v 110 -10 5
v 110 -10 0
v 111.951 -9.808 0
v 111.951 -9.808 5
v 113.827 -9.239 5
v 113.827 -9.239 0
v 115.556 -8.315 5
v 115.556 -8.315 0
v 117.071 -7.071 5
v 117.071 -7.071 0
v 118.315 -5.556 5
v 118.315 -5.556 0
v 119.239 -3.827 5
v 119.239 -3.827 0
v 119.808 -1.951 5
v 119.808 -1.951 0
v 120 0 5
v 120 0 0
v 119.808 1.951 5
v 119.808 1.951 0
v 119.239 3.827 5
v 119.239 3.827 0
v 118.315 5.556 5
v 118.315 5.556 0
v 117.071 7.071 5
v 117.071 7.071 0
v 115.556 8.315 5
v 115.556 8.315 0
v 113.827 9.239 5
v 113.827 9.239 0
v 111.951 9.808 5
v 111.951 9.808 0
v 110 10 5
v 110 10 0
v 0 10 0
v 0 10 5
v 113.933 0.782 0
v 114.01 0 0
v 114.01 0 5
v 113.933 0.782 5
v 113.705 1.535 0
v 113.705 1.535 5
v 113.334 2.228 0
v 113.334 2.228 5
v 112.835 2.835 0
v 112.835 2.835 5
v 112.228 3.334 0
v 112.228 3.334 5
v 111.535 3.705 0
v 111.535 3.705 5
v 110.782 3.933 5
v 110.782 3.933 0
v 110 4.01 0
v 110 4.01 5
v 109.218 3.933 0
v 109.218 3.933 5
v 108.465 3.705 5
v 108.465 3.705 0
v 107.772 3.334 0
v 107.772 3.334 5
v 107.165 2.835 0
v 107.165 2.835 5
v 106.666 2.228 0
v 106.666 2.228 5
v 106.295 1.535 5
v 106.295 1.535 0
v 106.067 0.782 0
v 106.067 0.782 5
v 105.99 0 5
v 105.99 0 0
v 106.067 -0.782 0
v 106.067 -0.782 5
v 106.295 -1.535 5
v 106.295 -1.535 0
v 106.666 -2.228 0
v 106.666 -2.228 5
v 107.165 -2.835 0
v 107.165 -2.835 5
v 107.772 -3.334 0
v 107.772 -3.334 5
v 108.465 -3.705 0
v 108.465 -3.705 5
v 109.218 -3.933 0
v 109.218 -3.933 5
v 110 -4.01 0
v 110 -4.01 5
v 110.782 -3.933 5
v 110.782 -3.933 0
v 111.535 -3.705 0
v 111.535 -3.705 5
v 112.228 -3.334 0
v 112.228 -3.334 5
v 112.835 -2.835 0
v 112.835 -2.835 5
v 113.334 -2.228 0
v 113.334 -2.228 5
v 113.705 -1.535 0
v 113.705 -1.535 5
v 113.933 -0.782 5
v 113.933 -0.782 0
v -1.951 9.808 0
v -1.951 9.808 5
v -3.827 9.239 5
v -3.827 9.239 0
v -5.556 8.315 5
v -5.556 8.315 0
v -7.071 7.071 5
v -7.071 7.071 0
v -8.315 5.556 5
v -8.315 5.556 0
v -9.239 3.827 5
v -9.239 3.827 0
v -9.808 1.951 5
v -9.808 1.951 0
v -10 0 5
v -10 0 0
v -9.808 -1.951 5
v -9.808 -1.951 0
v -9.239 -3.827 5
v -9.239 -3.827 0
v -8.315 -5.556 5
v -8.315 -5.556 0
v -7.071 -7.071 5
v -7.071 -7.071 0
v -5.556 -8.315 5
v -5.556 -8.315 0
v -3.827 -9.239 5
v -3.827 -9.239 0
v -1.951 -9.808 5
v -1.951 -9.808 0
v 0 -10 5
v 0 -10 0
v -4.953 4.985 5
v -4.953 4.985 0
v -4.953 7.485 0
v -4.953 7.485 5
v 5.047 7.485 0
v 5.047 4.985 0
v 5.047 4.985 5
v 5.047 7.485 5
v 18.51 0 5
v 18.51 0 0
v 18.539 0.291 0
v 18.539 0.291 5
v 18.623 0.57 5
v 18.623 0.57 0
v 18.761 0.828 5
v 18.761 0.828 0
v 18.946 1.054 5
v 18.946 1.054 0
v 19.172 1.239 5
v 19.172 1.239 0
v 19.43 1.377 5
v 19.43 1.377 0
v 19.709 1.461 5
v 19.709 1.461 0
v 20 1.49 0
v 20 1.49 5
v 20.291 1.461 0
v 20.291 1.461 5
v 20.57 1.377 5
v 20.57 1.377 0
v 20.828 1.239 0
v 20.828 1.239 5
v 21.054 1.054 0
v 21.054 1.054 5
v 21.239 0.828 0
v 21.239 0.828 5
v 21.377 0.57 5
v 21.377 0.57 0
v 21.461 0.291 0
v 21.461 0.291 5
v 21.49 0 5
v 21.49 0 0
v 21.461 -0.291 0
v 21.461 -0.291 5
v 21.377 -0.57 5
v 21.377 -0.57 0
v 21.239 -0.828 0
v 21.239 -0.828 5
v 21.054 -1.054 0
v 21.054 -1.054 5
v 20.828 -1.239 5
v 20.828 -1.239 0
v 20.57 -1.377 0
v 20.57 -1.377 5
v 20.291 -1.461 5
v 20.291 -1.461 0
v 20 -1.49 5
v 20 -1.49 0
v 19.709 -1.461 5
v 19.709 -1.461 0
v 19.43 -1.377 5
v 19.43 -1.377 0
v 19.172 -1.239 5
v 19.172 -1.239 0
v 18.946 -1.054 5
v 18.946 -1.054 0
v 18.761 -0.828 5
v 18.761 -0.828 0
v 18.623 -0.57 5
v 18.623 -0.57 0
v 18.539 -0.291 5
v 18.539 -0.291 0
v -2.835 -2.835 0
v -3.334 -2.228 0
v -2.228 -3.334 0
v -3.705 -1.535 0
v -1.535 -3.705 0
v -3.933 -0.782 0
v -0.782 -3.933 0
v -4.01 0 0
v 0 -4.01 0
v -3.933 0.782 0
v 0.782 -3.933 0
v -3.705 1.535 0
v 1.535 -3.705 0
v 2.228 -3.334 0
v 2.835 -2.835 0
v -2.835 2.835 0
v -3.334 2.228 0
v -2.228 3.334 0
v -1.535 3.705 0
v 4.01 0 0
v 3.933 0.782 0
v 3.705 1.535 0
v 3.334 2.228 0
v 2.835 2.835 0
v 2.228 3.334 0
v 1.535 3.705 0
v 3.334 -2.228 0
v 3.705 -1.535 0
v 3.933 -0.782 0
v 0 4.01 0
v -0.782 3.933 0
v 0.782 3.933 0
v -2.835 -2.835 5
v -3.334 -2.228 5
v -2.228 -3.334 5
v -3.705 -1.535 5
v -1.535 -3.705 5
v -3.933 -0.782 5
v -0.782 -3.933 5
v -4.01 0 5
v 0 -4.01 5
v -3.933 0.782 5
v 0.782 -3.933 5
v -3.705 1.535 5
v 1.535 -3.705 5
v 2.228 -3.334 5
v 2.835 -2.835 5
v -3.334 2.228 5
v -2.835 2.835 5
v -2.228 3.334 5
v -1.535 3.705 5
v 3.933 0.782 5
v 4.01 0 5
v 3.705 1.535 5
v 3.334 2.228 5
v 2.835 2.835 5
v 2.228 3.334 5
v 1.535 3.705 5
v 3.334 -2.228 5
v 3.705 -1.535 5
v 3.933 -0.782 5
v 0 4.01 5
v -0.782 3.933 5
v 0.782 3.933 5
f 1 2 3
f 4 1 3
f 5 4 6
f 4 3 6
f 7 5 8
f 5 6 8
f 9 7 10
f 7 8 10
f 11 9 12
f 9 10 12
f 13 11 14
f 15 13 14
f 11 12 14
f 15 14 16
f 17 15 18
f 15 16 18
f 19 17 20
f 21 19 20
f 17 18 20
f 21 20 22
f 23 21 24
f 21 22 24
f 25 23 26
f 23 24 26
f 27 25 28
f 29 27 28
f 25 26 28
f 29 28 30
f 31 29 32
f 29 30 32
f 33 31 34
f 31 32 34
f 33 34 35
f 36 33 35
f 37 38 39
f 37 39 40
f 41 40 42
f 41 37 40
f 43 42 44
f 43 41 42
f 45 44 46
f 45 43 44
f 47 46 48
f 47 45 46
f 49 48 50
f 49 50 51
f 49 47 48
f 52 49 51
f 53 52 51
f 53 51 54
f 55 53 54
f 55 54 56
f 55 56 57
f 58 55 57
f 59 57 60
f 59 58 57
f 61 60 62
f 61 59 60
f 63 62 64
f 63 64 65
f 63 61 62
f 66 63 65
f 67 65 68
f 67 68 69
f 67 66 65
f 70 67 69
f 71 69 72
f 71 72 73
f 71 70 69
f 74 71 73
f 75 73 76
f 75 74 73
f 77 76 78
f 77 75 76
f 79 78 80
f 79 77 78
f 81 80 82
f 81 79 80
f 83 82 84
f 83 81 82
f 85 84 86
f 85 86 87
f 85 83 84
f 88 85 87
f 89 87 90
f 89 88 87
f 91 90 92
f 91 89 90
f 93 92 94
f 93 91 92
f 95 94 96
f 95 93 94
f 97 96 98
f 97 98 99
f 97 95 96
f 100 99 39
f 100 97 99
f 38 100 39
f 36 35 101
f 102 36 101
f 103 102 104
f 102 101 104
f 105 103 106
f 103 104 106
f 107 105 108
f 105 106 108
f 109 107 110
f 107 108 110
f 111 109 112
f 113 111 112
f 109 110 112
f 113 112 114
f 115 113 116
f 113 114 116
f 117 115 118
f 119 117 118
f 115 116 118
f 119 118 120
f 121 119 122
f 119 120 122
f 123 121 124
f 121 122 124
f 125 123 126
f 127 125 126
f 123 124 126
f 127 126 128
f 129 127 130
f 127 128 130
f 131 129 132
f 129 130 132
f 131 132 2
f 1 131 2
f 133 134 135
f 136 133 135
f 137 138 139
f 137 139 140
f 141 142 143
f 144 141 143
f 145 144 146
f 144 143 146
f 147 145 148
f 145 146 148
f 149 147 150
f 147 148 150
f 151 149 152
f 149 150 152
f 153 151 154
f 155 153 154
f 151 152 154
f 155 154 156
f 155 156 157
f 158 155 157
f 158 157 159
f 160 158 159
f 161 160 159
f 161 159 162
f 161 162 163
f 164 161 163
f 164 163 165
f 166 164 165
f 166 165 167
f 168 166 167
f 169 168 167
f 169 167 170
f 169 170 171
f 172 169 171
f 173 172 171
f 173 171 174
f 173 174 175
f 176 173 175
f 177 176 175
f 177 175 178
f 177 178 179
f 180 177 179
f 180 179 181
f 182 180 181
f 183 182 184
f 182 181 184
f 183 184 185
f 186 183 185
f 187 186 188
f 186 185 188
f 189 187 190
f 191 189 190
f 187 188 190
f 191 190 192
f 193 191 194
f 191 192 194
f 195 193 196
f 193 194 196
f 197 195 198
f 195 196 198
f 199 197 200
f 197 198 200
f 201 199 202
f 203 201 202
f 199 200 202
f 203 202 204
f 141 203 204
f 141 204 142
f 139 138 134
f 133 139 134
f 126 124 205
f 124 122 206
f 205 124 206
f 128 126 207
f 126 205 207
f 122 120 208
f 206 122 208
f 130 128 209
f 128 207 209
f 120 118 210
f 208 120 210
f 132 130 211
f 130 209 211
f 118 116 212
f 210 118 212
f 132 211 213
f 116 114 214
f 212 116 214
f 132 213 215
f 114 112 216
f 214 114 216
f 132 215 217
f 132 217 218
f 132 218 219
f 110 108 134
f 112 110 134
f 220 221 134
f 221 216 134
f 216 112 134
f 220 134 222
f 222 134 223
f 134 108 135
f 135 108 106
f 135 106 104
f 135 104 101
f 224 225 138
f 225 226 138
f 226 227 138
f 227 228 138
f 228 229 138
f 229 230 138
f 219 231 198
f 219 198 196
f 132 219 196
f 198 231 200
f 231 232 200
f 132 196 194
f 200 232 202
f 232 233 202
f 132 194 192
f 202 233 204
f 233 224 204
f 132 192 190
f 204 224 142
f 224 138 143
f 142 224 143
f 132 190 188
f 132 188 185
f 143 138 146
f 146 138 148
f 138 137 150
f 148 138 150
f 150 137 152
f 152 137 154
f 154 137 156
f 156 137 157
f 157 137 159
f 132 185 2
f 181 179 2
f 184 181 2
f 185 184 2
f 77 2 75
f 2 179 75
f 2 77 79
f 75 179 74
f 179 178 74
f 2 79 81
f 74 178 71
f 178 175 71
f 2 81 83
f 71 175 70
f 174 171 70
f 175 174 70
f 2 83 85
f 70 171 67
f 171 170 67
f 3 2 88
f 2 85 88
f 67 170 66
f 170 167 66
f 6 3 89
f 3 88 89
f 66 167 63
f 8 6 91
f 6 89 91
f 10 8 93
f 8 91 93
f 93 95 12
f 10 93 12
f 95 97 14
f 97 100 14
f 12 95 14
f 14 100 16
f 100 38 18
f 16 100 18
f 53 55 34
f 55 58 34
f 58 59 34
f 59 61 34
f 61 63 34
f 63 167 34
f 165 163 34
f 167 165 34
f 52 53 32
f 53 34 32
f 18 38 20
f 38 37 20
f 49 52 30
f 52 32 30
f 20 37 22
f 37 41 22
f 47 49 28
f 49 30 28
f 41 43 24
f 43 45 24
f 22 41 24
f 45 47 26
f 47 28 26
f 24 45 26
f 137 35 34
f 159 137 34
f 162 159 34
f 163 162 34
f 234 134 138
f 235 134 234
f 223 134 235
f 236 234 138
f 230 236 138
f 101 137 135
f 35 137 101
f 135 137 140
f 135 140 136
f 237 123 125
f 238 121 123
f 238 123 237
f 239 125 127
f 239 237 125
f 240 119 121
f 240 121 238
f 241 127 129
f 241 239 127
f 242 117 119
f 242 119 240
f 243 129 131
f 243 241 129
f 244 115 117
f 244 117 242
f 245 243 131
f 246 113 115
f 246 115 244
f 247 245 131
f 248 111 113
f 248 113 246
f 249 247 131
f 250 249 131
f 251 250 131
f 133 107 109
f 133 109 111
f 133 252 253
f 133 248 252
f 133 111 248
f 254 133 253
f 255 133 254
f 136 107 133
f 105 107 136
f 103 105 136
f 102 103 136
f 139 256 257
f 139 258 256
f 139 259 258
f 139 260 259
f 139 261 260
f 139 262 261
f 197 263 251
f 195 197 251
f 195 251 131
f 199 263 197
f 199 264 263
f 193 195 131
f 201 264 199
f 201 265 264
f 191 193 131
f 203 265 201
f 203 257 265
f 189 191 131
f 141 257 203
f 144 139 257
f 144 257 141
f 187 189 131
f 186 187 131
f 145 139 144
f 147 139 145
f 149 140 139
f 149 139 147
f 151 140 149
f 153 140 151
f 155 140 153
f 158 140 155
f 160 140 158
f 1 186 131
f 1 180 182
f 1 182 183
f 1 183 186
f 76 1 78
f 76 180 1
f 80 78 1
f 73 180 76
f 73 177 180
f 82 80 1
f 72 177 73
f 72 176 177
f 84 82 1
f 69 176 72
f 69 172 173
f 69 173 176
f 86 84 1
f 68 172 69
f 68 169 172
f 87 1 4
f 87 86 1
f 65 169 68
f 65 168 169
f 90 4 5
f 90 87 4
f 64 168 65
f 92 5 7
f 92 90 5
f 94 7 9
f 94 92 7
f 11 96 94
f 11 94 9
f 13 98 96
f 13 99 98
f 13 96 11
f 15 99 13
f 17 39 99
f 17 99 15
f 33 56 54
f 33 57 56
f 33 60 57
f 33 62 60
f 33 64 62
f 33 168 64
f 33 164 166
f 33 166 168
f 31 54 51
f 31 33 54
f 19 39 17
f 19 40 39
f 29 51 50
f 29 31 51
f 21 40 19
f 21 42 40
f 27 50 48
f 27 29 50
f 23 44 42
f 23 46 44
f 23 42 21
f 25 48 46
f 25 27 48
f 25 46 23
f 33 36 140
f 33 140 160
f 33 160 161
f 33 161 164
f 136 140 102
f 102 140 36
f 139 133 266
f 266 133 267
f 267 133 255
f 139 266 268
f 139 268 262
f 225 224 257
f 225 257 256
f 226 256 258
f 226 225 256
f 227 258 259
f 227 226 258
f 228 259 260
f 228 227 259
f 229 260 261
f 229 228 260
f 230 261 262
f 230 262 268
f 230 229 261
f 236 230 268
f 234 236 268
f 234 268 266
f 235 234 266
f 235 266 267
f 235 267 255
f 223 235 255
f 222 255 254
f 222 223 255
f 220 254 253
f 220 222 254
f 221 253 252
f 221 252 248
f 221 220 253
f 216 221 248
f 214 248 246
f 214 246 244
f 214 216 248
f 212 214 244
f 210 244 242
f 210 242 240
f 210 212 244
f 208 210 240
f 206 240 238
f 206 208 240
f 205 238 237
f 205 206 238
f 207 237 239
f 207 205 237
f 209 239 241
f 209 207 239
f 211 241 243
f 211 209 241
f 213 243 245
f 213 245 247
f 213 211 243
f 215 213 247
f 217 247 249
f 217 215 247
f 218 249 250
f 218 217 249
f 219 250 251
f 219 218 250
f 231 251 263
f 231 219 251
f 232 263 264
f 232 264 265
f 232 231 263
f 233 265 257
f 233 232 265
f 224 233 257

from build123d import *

# Parameters (mm, degrees)
SKETCH1_R           = 4.01
BOSS_EXTRUDE1_DEPTH = 5
CUT_EXTRUDE1_REACH  = 122.52
SKETCH2_R           = 1.49
SKETCH4_W           = 10
SKETCH4_H           = 2.5
CUT_EXTRUDE2_DEPTH  = 10


with BuildPart() as part:
    # Sketch1 → Boss-Extrude1 (new body)
    with BuildSketch(Plane.XY):
        with BuildLine():
            Line((110, 10), (0, 10))
            ThreePointArc((0, 10), (-10, 0), (0, -10))
            Line((0, -10), (110, -10))
            ThreePointArc((110, -10), (120, 0), (110, 10))
        make_face()
        Circle(SKETCH1_R, mode=Mode.SUBTRACT)
        with Locations((110, 0)):
            Circle(SKETCH1_R, mode=Mode.SUBTRACT)
    extrude(amount=BOSS_EXTRUDE1_DEPTH)

    # Sketch2 → Cut-Extrude1 (cut, up to next)
    with BuildSketch(Plane(origin=(0, 0, 0), x_dir=(-1, 0, 0), z_dir=(0, 0, -1)), mode=Mode.PRIVATE) as cut_extrude1_sk1:
        with Locations((-20, 0)):
            Circle(SKETCH2_R)
    cut_extrude1_tool1 = extrude(cut_extrude1_sk1.sketch, amount=-CUT_EXTRUDE1_REACH, mode=Mode.PRIVATE) & part.part
    add(cut_extrude1_tool1.solids().sort_by_distance((20, 0, 0))[0], mode=Mode.SUBTRACT)

    # Sketch4 → Cut-Extrude2 (cut)
    with BuildSketch(Plane(origin=(0, 0, 0), x_dir=(-1, 0, 0), z_dir=(0, 0, -1))):
        with Locations((-0.046889456, 6.235161972)):
            Rectangle(SKETCH4_W, SKETCH4_H)
    extrude(amount=-CUT_EXTRUDE2_DEPTH, mode=Mode.SUBTRACT)


solid = part.part
